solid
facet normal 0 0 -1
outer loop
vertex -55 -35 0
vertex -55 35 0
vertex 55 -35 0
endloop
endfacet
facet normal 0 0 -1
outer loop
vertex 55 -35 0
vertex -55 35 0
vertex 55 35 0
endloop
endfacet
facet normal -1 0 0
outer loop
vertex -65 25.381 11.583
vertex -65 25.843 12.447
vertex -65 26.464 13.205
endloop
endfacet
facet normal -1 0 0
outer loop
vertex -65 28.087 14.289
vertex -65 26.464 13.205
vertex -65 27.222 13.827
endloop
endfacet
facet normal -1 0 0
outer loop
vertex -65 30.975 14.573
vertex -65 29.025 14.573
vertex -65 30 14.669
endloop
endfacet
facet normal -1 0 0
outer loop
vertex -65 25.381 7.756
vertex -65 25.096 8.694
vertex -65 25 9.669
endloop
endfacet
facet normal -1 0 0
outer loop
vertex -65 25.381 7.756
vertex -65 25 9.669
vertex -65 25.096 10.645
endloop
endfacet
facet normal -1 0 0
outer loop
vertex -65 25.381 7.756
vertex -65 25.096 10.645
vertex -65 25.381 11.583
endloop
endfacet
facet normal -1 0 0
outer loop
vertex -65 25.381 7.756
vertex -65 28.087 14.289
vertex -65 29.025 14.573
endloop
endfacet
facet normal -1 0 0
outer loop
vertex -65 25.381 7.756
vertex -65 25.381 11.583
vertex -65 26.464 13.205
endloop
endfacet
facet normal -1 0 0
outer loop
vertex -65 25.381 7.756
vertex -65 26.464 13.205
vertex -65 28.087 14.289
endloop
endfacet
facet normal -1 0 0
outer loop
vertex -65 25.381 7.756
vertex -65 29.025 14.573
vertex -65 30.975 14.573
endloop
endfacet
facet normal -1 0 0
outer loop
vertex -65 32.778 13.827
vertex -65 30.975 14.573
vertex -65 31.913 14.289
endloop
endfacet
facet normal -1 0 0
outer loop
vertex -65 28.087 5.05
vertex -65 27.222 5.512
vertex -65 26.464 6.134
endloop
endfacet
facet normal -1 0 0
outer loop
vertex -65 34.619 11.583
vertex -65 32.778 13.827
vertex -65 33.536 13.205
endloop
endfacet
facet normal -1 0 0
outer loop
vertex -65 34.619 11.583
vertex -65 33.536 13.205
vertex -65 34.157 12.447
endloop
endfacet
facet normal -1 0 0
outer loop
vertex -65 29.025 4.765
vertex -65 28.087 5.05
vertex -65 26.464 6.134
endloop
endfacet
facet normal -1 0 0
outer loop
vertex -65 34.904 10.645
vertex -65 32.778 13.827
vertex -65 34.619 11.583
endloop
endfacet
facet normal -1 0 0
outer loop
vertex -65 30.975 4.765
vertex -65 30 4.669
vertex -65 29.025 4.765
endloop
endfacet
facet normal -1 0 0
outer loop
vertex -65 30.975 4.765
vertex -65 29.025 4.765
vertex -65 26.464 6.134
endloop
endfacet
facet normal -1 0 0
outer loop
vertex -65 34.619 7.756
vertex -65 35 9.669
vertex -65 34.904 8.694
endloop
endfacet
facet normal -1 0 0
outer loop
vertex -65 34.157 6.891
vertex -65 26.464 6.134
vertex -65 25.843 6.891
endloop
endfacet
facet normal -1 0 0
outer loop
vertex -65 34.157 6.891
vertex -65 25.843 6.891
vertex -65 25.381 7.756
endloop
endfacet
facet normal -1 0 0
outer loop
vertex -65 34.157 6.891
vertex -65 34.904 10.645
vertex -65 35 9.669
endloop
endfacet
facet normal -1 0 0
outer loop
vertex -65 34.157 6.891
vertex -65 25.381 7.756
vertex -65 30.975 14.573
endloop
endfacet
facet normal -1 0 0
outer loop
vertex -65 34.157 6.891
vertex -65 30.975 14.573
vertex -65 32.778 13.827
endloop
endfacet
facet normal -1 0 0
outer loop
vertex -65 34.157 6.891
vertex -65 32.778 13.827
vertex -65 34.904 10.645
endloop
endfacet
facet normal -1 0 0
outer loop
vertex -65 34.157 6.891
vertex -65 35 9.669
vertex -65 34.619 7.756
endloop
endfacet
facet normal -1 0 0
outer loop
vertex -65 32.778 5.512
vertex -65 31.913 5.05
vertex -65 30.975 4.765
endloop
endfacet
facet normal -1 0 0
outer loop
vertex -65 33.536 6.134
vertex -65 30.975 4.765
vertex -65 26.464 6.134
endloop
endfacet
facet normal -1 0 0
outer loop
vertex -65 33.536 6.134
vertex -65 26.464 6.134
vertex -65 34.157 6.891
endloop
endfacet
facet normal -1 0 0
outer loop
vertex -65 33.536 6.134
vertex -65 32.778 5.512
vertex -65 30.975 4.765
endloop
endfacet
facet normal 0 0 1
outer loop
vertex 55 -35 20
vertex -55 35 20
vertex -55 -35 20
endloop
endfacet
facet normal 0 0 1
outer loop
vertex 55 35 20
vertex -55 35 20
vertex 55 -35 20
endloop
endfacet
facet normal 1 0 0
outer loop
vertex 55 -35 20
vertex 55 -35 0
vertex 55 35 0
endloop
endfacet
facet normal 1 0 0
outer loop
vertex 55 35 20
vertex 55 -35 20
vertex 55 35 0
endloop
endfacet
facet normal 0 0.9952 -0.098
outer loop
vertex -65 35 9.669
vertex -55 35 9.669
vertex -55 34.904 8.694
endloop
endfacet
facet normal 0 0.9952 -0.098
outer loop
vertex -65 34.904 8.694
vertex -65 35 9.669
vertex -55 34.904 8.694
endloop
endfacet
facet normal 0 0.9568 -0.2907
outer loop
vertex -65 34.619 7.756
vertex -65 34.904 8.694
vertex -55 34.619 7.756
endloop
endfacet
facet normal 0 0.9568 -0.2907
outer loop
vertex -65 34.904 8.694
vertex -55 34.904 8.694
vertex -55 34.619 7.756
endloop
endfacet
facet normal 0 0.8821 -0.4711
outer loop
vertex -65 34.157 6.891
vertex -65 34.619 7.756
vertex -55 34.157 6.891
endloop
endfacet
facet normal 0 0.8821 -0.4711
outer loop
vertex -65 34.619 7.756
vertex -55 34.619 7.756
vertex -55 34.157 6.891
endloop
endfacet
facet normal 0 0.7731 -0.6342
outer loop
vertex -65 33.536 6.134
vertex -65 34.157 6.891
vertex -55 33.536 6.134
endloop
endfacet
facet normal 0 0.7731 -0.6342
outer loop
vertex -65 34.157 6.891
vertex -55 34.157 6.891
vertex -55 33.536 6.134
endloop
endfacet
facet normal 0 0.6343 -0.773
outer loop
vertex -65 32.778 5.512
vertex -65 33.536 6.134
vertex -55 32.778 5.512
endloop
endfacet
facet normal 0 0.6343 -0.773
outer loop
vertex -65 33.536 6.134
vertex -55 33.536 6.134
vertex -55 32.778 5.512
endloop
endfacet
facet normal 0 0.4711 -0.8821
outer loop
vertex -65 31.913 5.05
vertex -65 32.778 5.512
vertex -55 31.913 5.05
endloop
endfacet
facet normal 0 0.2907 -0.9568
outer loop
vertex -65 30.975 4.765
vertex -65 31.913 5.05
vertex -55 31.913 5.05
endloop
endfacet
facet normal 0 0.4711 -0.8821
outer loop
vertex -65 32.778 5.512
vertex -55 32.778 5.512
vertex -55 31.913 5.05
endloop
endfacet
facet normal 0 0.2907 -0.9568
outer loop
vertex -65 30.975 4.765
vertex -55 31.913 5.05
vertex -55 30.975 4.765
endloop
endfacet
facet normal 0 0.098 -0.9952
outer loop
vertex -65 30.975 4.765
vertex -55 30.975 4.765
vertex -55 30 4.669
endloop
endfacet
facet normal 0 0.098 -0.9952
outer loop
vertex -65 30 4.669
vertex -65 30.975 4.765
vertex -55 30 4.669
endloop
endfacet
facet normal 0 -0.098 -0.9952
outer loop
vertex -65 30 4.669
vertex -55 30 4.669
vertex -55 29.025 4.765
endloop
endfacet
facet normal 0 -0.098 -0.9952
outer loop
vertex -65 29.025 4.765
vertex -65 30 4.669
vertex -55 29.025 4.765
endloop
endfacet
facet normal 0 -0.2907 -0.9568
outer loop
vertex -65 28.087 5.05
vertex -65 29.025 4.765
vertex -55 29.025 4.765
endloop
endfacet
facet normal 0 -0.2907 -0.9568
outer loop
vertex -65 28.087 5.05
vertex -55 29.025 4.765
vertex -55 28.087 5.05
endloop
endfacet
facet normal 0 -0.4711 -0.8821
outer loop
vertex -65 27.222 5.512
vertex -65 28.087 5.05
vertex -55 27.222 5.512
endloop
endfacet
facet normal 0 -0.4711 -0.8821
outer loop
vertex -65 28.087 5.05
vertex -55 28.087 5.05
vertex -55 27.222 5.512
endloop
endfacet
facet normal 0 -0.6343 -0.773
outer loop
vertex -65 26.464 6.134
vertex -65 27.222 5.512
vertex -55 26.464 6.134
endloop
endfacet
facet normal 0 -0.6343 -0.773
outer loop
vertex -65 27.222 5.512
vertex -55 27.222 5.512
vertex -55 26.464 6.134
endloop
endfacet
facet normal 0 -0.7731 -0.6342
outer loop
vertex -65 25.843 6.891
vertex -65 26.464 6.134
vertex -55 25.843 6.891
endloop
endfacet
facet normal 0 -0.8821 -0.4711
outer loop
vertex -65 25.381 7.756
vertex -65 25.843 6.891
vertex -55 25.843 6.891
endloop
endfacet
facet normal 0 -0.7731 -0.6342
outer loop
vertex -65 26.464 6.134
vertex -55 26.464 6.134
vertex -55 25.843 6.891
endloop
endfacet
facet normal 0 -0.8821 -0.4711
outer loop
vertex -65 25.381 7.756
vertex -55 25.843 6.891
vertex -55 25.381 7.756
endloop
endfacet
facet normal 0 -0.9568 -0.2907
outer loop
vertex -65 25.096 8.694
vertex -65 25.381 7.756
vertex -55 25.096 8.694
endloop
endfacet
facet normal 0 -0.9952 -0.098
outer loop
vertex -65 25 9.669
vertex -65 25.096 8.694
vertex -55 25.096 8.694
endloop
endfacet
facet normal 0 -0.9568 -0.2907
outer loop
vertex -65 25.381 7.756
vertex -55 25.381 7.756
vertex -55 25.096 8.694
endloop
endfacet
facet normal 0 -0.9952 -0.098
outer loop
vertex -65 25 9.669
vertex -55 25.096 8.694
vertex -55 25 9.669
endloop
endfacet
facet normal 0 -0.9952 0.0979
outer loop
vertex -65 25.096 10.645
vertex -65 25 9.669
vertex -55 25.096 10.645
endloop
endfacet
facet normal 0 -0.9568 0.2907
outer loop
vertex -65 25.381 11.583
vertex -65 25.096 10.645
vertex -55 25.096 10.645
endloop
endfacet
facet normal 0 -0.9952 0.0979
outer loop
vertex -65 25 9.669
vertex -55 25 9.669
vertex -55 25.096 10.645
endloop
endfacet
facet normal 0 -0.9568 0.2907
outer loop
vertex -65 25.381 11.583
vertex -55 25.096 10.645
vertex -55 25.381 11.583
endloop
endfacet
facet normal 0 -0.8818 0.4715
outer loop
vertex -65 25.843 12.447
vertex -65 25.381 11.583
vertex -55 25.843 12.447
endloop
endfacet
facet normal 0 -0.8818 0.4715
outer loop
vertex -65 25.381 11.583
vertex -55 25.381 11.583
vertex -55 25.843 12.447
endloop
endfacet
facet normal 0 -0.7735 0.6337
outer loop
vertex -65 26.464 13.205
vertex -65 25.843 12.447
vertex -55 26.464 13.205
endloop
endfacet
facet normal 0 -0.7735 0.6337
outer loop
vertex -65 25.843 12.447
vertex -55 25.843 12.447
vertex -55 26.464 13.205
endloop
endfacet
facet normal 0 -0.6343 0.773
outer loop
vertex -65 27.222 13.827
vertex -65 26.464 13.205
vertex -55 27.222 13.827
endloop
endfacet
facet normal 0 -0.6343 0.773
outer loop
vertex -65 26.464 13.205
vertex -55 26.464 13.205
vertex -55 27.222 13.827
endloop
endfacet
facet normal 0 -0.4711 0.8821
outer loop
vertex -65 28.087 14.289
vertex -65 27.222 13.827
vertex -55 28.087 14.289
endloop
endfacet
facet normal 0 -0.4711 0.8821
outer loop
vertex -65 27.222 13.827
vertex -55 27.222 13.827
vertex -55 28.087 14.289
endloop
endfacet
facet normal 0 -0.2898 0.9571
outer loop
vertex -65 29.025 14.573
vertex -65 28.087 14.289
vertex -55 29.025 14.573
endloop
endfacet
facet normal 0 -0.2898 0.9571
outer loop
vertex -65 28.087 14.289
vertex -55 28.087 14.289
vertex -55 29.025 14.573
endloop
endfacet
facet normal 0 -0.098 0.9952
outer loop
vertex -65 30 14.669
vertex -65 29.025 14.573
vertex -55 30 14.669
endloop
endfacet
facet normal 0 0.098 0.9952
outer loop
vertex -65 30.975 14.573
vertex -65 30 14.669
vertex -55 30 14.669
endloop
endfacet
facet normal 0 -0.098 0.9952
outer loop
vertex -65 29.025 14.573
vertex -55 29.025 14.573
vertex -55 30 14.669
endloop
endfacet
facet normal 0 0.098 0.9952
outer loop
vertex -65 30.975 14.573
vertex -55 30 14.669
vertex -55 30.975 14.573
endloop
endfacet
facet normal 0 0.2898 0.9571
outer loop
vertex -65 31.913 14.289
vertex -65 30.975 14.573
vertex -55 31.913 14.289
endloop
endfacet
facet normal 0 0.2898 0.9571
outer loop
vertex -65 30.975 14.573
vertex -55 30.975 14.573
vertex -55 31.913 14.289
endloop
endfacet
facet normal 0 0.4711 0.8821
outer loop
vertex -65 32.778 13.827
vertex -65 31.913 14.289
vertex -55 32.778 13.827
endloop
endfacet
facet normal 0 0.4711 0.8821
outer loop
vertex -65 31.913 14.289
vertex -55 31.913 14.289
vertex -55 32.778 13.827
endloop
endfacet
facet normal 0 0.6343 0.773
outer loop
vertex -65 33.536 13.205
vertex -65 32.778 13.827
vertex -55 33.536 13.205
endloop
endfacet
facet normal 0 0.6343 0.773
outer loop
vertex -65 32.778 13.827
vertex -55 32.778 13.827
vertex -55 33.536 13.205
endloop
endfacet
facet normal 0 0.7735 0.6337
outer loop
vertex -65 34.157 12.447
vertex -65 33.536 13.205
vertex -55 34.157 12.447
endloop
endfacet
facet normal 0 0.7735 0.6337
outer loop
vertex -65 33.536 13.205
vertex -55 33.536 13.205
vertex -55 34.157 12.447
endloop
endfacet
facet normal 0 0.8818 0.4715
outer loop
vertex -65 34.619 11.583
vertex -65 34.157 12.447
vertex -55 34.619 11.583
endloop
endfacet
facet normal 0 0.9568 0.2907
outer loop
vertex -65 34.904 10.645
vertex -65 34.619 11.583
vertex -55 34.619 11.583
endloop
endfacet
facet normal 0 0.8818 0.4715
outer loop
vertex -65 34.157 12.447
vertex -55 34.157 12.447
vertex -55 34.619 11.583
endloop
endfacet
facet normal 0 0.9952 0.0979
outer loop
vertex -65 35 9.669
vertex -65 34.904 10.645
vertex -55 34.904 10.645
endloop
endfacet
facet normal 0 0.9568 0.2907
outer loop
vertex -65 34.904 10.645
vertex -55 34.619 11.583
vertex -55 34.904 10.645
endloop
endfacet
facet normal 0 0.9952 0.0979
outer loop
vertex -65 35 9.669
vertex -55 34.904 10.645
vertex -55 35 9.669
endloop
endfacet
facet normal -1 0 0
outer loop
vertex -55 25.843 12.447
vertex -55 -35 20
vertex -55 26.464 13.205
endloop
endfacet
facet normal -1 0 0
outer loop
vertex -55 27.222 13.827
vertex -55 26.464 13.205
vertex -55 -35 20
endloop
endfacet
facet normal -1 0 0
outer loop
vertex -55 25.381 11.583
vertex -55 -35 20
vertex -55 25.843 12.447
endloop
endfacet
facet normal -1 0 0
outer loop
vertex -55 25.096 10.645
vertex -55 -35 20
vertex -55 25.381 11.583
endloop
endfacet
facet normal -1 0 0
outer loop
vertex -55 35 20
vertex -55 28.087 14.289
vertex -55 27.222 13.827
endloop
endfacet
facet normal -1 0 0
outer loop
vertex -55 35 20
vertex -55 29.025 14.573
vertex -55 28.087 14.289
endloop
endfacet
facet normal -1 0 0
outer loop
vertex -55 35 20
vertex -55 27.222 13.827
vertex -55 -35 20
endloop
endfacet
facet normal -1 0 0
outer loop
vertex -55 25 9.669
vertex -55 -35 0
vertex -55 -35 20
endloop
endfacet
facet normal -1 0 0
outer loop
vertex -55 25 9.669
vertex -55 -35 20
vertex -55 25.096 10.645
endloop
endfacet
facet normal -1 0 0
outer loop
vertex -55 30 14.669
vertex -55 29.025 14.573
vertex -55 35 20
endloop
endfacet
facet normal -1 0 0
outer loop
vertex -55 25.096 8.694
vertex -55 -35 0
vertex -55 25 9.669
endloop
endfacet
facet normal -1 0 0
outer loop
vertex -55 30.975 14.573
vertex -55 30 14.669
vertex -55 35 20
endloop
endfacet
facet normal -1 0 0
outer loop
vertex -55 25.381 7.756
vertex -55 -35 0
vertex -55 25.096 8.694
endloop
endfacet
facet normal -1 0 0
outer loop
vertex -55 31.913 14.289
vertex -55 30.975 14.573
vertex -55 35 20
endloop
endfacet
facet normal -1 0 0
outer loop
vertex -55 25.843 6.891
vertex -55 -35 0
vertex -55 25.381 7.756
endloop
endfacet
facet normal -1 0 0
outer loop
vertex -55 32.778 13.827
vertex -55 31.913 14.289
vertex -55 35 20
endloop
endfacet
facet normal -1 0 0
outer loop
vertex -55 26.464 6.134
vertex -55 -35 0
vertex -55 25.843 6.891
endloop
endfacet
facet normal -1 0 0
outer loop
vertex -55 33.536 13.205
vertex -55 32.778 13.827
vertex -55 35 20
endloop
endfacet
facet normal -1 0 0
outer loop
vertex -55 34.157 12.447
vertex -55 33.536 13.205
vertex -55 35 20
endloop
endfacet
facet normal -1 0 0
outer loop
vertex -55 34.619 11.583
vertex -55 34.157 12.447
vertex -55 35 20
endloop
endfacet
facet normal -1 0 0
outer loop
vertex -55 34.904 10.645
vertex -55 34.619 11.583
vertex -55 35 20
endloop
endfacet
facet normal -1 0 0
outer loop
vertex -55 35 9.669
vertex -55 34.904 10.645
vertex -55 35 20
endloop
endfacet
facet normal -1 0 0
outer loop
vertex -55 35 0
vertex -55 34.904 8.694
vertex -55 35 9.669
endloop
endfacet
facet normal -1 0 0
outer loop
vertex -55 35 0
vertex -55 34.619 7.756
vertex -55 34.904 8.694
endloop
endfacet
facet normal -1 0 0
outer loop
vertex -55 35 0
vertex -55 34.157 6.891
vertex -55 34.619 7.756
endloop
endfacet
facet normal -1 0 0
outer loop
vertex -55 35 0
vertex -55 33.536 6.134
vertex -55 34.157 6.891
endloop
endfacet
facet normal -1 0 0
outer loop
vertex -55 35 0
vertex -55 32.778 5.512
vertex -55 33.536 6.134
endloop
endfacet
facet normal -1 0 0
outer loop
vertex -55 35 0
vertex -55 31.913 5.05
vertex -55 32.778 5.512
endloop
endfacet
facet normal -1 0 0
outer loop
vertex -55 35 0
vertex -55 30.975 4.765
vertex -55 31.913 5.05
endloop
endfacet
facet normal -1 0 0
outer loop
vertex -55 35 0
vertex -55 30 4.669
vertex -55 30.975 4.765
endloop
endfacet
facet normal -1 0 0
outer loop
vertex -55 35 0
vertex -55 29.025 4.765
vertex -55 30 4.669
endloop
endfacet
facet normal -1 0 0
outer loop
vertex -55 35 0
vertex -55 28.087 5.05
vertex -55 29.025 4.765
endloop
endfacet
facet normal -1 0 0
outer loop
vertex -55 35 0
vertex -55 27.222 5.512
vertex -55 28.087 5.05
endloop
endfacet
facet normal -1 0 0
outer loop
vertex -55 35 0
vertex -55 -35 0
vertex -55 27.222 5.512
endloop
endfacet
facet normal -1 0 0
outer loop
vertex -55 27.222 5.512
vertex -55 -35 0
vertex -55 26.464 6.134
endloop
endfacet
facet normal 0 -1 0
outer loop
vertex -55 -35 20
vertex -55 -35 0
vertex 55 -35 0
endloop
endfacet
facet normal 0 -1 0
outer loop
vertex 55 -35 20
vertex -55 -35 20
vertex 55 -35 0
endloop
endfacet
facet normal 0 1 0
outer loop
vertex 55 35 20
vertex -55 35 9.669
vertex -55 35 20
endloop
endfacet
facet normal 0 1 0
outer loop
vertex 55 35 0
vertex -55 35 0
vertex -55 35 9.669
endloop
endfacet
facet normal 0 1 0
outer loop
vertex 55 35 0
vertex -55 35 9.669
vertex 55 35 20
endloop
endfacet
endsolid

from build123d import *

# Parameters (mm, degrees)
SKETCH_1_W      = 110
SKETCH_1_H      = 70
EXTRUDE_1_DEPTH = 20
SKETCH_2_R      = 5
EXTRUDE_2_DEPTH = 10


with BuildPart() as part:
    # 草图1 → 凸台-拉伸1 (new body)
    with BuildSketch(Plane.XY):
        Rectangle(SKETCH_1_W, SKETCH_1_H)
    extrude(amount=EXTRUDE_1_DEPTH)

    # 草图2 → 凸台-拉伸2 (add)
    with BuildSketch(Plane.ZY.offset(55)):
        with Locations(Location((9.669244668, 30, 0), (0, 0, 90))):
            Circle(SKETCH_2_R)
    extrude(amount=EXTRUDE_2_DEPTH)


solid = part.part
